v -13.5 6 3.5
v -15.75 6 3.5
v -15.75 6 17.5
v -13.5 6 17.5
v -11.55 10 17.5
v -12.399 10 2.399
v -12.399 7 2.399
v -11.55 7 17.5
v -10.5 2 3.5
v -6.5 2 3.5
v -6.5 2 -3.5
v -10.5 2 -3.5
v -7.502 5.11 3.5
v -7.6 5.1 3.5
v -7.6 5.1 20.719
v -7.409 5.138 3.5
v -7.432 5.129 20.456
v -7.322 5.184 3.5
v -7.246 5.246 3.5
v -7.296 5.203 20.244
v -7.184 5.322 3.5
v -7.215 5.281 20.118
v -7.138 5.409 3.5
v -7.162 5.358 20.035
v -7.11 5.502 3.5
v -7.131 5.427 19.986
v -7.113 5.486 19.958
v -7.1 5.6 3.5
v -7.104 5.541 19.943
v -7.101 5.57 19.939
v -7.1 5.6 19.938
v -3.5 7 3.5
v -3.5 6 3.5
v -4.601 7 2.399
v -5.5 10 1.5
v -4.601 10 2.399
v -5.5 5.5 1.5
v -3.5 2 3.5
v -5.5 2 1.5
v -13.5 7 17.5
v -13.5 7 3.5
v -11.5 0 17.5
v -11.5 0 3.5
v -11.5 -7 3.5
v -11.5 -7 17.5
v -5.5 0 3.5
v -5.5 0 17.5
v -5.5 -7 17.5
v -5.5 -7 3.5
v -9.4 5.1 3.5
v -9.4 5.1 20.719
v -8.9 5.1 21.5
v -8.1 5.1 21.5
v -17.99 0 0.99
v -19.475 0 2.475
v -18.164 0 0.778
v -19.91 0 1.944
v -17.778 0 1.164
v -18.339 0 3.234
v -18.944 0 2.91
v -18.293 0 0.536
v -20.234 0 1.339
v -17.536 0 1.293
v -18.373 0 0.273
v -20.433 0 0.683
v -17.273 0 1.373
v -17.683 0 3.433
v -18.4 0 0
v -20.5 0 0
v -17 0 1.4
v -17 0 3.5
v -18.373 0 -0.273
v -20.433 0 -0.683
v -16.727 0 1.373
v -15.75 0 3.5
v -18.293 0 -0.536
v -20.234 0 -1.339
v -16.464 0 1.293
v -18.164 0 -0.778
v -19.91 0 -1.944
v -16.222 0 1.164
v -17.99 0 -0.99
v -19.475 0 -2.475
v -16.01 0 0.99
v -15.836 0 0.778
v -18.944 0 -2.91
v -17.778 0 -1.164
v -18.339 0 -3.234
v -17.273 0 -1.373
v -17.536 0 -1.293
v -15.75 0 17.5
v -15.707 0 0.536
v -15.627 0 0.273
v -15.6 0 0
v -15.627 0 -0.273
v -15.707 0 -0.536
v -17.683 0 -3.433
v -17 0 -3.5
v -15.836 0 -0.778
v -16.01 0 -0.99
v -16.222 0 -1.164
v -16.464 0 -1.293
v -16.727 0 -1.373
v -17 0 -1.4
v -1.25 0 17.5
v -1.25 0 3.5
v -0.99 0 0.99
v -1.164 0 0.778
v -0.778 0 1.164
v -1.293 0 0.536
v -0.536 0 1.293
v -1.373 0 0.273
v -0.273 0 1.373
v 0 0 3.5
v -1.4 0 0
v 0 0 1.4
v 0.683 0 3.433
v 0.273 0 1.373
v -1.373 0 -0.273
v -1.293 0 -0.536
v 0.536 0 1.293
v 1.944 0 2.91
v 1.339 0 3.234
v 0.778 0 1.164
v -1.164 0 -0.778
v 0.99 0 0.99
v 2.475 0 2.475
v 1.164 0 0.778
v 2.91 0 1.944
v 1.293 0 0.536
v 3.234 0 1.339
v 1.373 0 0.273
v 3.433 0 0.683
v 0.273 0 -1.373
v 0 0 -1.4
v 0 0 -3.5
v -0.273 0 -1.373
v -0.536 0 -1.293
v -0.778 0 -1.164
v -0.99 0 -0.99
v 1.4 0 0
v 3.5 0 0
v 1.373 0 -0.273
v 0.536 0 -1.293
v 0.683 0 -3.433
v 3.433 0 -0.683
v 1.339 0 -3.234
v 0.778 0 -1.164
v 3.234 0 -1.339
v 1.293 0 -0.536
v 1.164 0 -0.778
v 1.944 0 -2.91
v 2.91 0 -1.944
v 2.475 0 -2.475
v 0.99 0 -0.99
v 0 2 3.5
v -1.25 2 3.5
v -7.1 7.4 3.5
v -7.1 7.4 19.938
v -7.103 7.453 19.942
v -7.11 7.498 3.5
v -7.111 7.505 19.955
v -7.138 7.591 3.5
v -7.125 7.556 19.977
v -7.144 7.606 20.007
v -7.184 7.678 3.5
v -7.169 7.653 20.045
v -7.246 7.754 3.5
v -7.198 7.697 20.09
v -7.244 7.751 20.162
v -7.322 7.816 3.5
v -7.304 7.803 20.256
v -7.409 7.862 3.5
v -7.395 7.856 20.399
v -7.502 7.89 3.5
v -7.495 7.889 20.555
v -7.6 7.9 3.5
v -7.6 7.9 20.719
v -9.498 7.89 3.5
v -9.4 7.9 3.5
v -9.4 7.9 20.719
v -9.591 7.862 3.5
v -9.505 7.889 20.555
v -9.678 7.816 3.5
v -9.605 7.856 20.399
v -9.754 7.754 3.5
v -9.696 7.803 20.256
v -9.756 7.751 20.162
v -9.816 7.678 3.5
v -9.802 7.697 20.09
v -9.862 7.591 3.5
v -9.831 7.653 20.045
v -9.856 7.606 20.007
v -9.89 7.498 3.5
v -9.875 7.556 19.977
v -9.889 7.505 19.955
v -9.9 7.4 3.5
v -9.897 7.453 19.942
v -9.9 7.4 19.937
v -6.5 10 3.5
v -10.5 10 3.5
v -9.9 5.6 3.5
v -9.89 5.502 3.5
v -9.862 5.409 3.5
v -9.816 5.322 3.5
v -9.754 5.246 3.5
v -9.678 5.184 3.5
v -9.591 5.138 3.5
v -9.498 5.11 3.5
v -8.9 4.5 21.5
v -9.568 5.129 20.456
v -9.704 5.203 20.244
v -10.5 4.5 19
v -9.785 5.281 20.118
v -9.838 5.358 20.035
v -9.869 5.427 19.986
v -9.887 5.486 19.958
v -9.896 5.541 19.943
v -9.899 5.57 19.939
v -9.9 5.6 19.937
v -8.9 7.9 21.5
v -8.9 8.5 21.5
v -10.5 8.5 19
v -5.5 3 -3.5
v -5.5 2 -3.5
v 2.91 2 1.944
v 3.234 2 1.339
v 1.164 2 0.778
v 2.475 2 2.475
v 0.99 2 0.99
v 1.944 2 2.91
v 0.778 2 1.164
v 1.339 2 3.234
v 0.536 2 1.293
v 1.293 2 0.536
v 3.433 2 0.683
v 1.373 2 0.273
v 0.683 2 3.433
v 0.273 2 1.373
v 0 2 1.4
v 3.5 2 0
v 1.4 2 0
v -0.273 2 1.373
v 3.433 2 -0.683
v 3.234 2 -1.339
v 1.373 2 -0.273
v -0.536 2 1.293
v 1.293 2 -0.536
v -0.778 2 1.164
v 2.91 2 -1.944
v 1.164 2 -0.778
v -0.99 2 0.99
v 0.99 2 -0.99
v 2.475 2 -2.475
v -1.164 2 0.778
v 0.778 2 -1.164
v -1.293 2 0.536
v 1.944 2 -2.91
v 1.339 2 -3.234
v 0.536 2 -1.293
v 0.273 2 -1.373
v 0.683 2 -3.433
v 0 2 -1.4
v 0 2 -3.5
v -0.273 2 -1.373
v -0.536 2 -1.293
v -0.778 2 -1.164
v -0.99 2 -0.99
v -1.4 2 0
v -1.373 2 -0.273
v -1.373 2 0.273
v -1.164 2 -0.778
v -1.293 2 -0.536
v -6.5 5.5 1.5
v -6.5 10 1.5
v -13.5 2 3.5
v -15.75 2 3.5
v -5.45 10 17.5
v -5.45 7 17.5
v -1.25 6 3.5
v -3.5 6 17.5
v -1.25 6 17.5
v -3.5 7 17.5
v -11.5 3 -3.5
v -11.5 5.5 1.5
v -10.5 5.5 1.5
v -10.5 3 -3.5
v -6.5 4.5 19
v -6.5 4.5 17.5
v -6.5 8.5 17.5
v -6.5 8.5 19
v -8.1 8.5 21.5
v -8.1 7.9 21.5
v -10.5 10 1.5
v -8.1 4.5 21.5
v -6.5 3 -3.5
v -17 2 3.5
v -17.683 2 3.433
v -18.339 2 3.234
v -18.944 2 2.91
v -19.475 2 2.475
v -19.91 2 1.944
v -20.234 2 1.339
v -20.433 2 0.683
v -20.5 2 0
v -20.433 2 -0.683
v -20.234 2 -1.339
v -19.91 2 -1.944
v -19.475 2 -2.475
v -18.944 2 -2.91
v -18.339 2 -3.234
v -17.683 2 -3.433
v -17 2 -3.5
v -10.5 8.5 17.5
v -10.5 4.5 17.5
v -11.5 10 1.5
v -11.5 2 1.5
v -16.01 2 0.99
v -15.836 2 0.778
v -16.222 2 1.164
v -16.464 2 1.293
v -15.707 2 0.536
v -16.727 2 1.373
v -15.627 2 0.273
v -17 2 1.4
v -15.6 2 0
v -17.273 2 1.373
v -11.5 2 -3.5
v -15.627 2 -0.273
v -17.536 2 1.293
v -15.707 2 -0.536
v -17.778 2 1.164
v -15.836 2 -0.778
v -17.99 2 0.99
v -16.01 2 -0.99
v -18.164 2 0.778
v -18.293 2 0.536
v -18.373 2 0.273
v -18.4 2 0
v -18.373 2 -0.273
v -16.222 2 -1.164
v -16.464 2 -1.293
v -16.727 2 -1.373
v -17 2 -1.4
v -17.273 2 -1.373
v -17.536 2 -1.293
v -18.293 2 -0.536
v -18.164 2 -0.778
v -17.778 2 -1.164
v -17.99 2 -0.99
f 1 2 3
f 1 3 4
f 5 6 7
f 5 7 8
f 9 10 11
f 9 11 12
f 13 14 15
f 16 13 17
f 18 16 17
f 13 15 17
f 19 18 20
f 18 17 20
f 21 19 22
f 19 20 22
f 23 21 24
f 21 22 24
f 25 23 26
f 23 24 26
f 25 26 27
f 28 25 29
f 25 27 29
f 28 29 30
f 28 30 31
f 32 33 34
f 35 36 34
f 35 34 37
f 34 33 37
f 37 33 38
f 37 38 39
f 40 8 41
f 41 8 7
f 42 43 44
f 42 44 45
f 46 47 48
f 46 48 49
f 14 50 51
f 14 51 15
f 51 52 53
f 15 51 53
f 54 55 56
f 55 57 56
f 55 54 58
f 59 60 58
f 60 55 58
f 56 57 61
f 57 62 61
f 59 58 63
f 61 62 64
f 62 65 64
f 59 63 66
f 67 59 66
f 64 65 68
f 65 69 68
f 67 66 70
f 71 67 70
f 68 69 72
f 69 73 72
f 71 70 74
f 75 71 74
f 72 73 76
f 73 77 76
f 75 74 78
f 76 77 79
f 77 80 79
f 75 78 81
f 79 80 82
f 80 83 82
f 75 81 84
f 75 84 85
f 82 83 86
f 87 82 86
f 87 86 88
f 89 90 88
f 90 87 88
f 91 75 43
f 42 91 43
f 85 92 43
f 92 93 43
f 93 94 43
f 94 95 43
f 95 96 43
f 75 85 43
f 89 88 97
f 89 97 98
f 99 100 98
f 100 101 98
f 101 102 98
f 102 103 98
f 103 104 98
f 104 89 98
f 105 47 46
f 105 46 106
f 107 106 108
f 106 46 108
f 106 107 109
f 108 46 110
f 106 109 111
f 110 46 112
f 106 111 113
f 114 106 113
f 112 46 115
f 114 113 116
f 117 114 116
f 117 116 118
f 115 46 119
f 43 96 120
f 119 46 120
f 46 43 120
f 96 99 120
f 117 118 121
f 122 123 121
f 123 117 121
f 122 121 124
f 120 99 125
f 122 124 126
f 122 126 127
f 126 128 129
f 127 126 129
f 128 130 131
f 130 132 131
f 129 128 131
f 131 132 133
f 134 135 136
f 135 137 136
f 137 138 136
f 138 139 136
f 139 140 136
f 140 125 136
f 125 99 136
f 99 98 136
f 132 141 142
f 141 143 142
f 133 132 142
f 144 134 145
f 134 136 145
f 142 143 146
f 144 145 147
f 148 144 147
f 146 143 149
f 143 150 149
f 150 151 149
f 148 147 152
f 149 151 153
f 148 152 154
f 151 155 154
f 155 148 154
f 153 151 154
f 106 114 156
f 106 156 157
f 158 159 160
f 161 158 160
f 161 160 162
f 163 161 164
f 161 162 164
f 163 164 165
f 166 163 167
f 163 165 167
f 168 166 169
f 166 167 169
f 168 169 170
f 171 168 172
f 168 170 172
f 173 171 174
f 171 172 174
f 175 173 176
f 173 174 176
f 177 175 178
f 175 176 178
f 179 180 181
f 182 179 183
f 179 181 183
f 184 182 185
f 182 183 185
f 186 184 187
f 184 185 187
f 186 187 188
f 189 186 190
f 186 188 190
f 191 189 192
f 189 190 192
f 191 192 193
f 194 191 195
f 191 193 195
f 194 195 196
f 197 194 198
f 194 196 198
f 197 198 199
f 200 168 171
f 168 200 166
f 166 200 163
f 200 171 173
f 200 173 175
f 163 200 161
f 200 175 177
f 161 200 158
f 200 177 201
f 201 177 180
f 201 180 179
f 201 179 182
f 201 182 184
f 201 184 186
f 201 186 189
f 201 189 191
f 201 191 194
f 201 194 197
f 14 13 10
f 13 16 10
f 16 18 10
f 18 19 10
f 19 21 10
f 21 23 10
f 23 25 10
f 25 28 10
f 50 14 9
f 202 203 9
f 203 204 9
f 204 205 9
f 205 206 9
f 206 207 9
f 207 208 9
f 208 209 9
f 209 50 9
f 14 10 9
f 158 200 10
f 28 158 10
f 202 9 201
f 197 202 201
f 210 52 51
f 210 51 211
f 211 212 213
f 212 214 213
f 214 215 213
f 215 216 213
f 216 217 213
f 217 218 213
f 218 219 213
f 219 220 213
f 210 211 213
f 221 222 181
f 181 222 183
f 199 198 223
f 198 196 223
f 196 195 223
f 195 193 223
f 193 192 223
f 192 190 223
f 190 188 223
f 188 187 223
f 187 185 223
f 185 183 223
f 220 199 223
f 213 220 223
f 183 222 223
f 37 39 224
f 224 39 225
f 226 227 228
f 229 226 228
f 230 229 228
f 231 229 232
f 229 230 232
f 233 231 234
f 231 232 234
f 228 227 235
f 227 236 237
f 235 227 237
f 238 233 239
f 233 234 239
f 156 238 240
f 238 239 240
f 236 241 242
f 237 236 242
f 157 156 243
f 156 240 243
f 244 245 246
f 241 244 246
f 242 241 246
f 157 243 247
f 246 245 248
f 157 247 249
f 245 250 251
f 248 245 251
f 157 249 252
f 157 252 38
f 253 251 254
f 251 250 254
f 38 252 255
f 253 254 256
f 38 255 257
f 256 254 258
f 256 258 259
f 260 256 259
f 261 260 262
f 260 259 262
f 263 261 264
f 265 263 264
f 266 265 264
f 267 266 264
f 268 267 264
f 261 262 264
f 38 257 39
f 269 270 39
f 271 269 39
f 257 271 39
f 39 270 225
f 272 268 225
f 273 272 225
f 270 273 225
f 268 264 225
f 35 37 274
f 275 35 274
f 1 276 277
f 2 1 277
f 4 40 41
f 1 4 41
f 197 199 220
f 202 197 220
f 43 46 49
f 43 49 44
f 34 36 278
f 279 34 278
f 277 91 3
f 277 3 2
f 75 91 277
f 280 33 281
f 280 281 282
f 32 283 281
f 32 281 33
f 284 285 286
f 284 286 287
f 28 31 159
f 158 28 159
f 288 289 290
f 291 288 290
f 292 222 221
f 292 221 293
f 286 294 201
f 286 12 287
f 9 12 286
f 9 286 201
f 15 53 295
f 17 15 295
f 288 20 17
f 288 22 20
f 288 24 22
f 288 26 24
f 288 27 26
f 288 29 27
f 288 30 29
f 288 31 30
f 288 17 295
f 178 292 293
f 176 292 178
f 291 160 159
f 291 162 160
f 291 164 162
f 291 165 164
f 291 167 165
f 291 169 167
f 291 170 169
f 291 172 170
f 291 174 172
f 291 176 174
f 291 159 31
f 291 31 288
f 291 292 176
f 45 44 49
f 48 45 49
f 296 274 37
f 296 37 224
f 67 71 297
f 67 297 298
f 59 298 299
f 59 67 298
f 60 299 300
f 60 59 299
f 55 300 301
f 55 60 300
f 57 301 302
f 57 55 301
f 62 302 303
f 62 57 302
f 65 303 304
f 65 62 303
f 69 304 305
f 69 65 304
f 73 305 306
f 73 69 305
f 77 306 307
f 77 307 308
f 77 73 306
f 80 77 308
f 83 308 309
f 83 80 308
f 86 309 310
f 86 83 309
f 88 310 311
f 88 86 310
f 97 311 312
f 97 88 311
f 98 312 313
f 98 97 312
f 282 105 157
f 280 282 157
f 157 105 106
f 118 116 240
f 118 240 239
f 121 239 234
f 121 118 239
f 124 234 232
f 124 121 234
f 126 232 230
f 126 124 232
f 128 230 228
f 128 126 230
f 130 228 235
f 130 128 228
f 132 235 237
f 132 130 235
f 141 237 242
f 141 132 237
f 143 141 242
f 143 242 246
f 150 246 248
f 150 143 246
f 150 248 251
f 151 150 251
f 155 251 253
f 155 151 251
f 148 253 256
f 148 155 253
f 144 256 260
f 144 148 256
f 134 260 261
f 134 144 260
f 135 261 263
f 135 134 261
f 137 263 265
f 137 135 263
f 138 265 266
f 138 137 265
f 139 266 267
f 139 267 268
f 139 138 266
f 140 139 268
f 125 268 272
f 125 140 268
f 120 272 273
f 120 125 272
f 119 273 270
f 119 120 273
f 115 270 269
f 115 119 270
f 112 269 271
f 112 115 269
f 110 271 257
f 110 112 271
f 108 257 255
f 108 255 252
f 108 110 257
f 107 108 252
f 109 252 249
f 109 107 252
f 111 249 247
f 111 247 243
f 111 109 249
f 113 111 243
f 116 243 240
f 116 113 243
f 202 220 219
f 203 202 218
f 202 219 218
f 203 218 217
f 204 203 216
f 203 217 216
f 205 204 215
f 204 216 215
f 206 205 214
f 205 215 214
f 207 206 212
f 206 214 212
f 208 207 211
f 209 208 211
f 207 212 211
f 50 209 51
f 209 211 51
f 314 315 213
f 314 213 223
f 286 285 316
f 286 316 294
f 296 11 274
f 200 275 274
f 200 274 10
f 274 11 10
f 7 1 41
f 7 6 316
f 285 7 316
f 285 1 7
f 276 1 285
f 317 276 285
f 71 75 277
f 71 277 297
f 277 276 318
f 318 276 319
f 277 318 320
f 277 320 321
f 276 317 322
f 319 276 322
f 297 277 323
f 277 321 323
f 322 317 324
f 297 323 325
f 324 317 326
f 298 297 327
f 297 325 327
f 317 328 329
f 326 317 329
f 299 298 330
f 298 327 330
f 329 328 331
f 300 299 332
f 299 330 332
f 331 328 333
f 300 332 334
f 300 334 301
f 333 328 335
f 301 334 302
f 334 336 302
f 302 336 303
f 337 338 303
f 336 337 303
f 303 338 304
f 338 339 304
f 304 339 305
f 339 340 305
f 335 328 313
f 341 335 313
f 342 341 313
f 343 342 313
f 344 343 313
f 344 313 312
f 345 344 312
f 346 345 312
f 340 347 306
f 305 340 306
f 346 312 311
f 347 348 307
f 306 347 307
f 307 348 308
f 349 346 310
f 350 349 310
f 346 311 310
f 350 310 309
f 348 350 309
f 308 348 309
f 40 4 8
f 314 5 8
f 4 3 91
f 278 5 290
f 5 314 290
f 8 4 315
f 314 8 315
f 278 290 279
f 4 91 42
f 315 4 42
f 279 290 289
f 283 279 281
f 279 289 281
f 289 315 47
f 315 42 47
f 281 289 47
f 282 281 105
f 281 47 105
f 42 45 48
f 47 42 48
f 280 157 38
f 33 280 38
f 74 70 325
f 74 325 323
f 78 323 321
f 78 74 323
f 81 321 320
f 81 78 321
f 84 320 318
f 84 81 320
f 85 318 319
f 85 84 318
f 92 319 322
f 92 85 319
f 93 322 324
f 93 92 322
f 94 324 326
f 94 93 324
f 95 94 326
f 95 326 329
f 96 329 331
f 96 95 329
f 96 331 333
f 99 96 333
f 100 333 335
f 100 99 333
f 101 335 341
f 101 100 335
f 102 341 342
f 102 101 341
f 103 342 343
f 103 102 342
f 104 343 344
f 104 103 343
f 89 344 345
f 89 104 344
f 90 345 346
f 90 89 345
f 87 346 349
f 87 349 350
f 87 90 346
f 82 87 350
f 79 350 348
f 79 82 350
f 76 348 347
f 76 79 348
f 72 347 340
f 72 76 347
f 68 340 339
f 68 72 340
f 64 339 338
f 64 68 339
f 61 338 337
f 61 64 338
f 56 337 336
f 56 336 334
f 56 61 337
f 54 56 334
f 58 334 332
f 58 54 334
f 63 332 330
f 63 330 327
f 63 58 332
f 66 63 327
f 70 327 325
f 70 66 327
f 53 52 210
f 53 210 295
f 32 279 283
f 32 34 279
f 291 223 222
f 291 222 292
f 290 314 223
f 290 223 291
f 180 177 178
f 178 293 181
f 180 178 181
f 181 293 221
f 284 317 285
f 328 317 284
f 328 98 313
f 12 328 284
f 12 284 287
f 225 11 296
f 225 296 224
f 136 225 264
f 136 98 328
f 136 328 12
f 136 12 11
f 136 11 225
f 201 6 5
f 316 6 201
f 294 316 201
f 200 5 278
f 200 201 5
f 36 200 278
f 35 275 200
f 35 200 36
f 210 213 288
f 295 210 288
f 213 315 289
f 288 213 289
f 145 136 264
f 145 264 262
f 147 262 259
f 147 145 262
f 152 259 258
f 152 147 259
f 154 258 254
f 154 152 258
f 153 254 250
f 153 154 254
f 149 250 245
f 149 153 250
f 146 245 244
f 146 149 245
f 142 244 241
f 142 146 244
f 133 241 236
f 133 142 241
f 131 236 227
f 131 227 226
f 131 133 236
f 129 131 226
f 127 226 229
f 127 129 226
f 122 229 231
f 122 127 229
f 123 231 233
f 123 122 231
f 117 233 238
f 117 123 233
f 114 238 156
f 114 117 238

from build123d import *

# Parameters (mm, degrees)
SZKIC1_R                    = 1.4
DODANIE_WYCI_GNI_CIE1_DEPTH = 2
SZKIC1_3_W                  = 4.25
SZKIC1_3_H                  = 14
DODANIE_WYCI_GNI_CIE2_DEPTH = 7
DODANIE_WYCI_GNI_CIE3_DEPTH = 7
SZKIC2_W                    = 10
SZKIC2_H                    = 14
DODANIE_WYCI_GNI_CIE4_DEPTH = 3
DODANIE_WYCI_GNI_CIE5_START = 2
SZKIC1_5_W                  = 1
SZKIC1_5_H                  = 7
DODANIE_WYCI_GNI_CIE5_DEPTH = 3.5
DODANIE_WYCI_GNI_CIE6_REACH = 30.417
WYTNIJ_WYCI_GNI_CIE1_REACH  = 27.125
WYTNIJ_WYCI_GNI_CIE2_DEPTH  = 3
SZKIC6_W                    = 2.25
SZKIC6_H                    = 14
WYTNIJ_WYCI_GNI_CIE3_DEPTH  = 1
SZKIC7_W                    = 4
SZKIC7_H                    = 4
DODANIE_WYCI_GNI_CIE7_DEPTH = 4
WYTNIJ_WYCI_GNI_CIE4_DEPTH  = 4
WYTNIJ_WYCI_GNI_CIE5_DEPTH  = 34.841542518


with BuildPart() as part:
    # Szkic1 → Dodanie-wyciągnięcie1 (new body)
    with BuildSketch(Plane(origin=(0, 0, 0), x_dir=(1, 0, 0), z_dir=(0, 1, 0))):
        with BuildLine():
            Line((-17, 3.5), (0, 3.5))
            ThreePointArc((0, 3.5), (3.5, 0), (0, -3.5))
            Line((0, -3.5), (-17, -3.5))
            ThreePointArc((-17, -3.5), (-20.5, 0), (-17, 3.5))
        make_face()
        with Locations(Location((-17, 0, 0), (0, 0, 270))):
            Circle(SZKIC1_R, mode=Mode.SUBTRACT)
        with Locations(Location((0, 0, 0), (0, 0, 270))):
            Circle(SZKIC1_R, mode=Mode.SUBTRACT)
    extrude(amount=DODANIE_WYCI_GNI_CIE1_DEPTH)

    # Szkic1<3> → Dodanie-wyciągnięcie2 (add)
    with BuildSketch(Plane(origin=(0, 0, 0), x_dir=(1, 0, 0), z_dir=(0, 1, 0))):
        with Locations((-13.625, -10.5)):
            Rectangle(SZKIC1_3_W, SZKIC1_3_H)
        Polygon((-10.5, -3.5), (-11.5, -3.5), (-11.5, -17.5), (-5.5, -17.5), (-5.5, -3.5), (-6.5, -3.5), align=None)
        with Locations((-3.375, -10.5)):
            Rectangle(SZKIC1_3_W, SZKIC1_3_H)
    extrude(amount=DODANIE_WYCI_GNI_CIE2_DEPTH)

    # Szkic1<4> → Dodanie-wyciągnięcie3 (add)
    with BuildSketch(Plane(origin=(0, 0, 0), x_dir=(1, 0, 0), z_dir=(0, 1, 0))):
        Polygon((-10.5, -3.5), (-11.5, -3.5), (-11.5, -17.5), (-5.5, -17.5), (-5.5, -3.5), (-6.5, -3.5), align=None)
    extrude(amount=-DODANIE_WYCI_GNI_CIE3_DEPTH)

    # Szkic2 → Dodanie-wyciągnięcie4 (add)
    with BuildSketch(Plane(origin=(0, 7, 0), x_dir=(1, 0, 0), z_dir=(0, 1, 0))):
        with Locations((-8.5, -10.5)):
            Rectangle(SZKIC2_W, SZKIC2_H)
    extrude(amount=DODANIE_WYCI_GNI_CIE4_DEPTH)

    # Szkic1<5> → Dodanie-wyciągnięcie5 (add)
    with BuildSketch(Plane(origin=(0, 0, 0), x_dir=(1, 0, 0), z_dir=(0, 1, 0)).offset(DODANIE_WYCI_GNI_CIE5_START)):
        with Locations((-6, 0)):
            Rectangle(SZKIC1_5_W, SZKIC1_5_H)
        with Locations((-11, 0)):
            Rectangle(SZKIC1_5_W, SZKIC1_5_H)
    extrude(amount=DODANIE_WYCI_GNI_CIE5_DEPTH)

    # Dodanie-wyciągnięcie6: up to this face of the body (flat: up to its plane)
    dodanie_wyci_gni_cie6_end = Plane(part.part.faces().sort_by_distance((-8.5, 10, 10.5))[0])
    # Szkic3 → Dodanie-wyciągnięcie6 (add, up to the picked face)
    with BuildSketch(Plane(origin=(0, 2, 0), x_dir=(1, 0, 0), z_dir=(0, 1, 0)), mode=Mode.PRIVATE) as dodanie_wyci_gni_cie6_sk1:
        Polygon((-3.5, -3.5), (-5.5, -1.5), (-6.5, -1.5), (-6.5, -3.5), (-5.5, -3.5), align=None)
    dodanie_wyci_gni_cie6_tool1 = split(extrude(dodanie_wyci_gni_cie6_sk1.sketch, amount=DODANIE_WYCI_GNI_CIE6_REACH, mode=Mode.PRIVATE), bisect_by=dodanie_wyci_gni_cie6_end, keep=Keep.BOTH, mode=Mode.PRIVATE)
    # Szkic3 → Dodanie-wyciągnięcie6 (add, up to the picked face)
    with BuildSketch(Plane(origin=(0, 2, 0), x_dir=(1, 0, 0), z_dir=(0, 1, 0)), mode=Mode.PRIVATE) as dodanie_wyci_gni_cie6_sk2:
        Polygon((-11.5, -3.5), (-13.5, -3.5), (-11.5, -1.5), (-10.5, -1.5), (-10.5, -3.5), align=None)
    dodanie_wyci_gni_cie6_tool2 = split(extrude(dodanie_wyci_gni_cie6_sk2.sketch, amount=DODANIE_WYCI_GNI_CIE6_REACH, mode=Mode.PRIVATE), bisect_by=dodanie_wyci_gni_cie6_end, keep=Keep.BOTH, mode=Mode.PRIVATE)
    add(dodanie_wyci_gni_cie6_tool1.solids().sort_by(Axis((-5.416667, 2, 2.666667), (0, 1, 0)))[0])
    add(dodanie_wyci_gni_cie6_tool2.solids().sort_by(Axis((-11.583333, 2, 2.666667), (0, 1, 0)))[0])

    # Wytnij-wyciągnięcie1: up to this face of the body (flat: up to its plane)
    wytnij_wyci_gni_cie1_end = Plane(part.part.faces().sort_by_distance((-5.5, 3.75, -1))[0])
    # Szkic4 → Wytnij-wyciągnięcie1 (cut, up to the picked face)
    with BuildSketch(Plane.ZY.offset(11.5), mode=Mode.PRIVATE) as wytnij_wyci_gni_cie1_sk1:
        Polygon((1.5, 5.5), (-3.5, 3), (-3.5, 5.5), align=None)
    wytnij_wyci_gni_cie1_tool1 = split(extrude(wytnij_wyci_gni_cie1_sk1.sketch, amount=-WYTNIJ_WYCI_GNI_CIE1_REACH, mode=Mode.PRIVATE), bisect_by=wytnij_wyci_gni_cie1_end, keep=Keep.BOTH, mode=Mode.PRIVATE)
    add(wytnij_wyci_gni_cie1_tool1.solids().sort_by(Axis((-11.5, 4.666667, -1.833333), (1, 0, 0)))[0], mode=Mode.SUBTRACT)

    # Szkic5 → Wytnij-wyciągnięcie2 (cut)
    with BuildSketch(Plane(origin=(0, 10, 0), x_dir=(1, 0, 0), z_dir=(0, 1, 0))):
        Polygon((-5.45, -17.5), (-3.5, -17.5), (-3.5, -3.5), (-4.600591716, -2.399408284), align=None)
        Polygon((-13.5, -3.5), (-12.399408284, -2.399408284), (-11.55, -17.5), (-13.5, -17.5), align=None)
    extrude(amount=-WYTNIJ_WYCI_GNI_CIE2_DEPTH, mode=Mode.SUBTRACT)

    # Szkic6 → Wytnij-wyciągnięcie3 (cut)
    with BuildSketch(Plane(origin=(0, 7, 0), x_dir=(1, 0, 0), z_dir=(0, 1, 0))):
        with Locations((-2.375, -10.5)):
            Rectangle(SZKIC6_W, SZKIC6_H)
        with Locations((-14.625, -10.5)):
            Rectangle(SZKIC6_W, SZKIC6_H)
    extrude(amount=-WYTNIJ_WYCI_GNI_CIE3_DEPTH, mode=Mode.SUBTRACT)

    # Szkic7 → Dodanie-wyciągnięcie7 (add)
    with BuildSketch(Plane.XY.offset(17.5)):
        with Locations((-8.5, 6.5)):
            Rectangle(SZKIC7_W, SZKIC7_H)
    extrude(amount=DODANIE_WYCI_GNI_CIE7_DEPTH)

    # Szkic8 → Wytnij-wyciągnięcie4 (cut)
    with BuildSketch(Plane(origin=(0, 8.5, 0), x_dir=(1, 0, 0), z_dir=(0, 1, 0))):
        Polygon((-8.1, -21.5), (-6.5, -19), (-6.5, -21.5), align=None)
        Polygon((-8.9, -21.5), (-10.5, -19), (-10.5, -21.5), align=None)
    extrude(amount=-WYTNIJ_WYCI_GNI_CIE4_DEPTH, mode=Mode.SUBTRACT)

    # Szkic9 → Wytnij-wyciągnięcie5 (cut, through all)
    with BuildSketch(Plane.XY.offset(21.5)):
        with BuildLine():
            Line((-7.6, 7.9), (-9.4, 7.9))
            ThreePointArc((-9.4, 7.9), (-9.753553391, 7.753553391), (-9.9, 7.4))
            Line((-9.9, 7.4), (-9.9, 5.6))
            ThreePointArc((-9.9, 5.6), (-9.753553391, 5.246446609), (-9.4, 5.1))
            Line((-9.4, 5.1), (-7.6, 5.1))
            ThreePointArc((-7.6, 5.1), (-7.246446609, 5.246446609), (-7.1, 5.6))
            Line((-7.1, 5.6), (-7.1, 7.4))
            ThreePointArc((-7.1, 7.4), (-7.246446609, 7.753553391), (-7.6, 7.9))
        make_face()
    extrude(amount=-WYTNIJ_WYCI_GNI_CIE5_DEPTH, mode=Mode.SUBTRACT)


solid = part.part
